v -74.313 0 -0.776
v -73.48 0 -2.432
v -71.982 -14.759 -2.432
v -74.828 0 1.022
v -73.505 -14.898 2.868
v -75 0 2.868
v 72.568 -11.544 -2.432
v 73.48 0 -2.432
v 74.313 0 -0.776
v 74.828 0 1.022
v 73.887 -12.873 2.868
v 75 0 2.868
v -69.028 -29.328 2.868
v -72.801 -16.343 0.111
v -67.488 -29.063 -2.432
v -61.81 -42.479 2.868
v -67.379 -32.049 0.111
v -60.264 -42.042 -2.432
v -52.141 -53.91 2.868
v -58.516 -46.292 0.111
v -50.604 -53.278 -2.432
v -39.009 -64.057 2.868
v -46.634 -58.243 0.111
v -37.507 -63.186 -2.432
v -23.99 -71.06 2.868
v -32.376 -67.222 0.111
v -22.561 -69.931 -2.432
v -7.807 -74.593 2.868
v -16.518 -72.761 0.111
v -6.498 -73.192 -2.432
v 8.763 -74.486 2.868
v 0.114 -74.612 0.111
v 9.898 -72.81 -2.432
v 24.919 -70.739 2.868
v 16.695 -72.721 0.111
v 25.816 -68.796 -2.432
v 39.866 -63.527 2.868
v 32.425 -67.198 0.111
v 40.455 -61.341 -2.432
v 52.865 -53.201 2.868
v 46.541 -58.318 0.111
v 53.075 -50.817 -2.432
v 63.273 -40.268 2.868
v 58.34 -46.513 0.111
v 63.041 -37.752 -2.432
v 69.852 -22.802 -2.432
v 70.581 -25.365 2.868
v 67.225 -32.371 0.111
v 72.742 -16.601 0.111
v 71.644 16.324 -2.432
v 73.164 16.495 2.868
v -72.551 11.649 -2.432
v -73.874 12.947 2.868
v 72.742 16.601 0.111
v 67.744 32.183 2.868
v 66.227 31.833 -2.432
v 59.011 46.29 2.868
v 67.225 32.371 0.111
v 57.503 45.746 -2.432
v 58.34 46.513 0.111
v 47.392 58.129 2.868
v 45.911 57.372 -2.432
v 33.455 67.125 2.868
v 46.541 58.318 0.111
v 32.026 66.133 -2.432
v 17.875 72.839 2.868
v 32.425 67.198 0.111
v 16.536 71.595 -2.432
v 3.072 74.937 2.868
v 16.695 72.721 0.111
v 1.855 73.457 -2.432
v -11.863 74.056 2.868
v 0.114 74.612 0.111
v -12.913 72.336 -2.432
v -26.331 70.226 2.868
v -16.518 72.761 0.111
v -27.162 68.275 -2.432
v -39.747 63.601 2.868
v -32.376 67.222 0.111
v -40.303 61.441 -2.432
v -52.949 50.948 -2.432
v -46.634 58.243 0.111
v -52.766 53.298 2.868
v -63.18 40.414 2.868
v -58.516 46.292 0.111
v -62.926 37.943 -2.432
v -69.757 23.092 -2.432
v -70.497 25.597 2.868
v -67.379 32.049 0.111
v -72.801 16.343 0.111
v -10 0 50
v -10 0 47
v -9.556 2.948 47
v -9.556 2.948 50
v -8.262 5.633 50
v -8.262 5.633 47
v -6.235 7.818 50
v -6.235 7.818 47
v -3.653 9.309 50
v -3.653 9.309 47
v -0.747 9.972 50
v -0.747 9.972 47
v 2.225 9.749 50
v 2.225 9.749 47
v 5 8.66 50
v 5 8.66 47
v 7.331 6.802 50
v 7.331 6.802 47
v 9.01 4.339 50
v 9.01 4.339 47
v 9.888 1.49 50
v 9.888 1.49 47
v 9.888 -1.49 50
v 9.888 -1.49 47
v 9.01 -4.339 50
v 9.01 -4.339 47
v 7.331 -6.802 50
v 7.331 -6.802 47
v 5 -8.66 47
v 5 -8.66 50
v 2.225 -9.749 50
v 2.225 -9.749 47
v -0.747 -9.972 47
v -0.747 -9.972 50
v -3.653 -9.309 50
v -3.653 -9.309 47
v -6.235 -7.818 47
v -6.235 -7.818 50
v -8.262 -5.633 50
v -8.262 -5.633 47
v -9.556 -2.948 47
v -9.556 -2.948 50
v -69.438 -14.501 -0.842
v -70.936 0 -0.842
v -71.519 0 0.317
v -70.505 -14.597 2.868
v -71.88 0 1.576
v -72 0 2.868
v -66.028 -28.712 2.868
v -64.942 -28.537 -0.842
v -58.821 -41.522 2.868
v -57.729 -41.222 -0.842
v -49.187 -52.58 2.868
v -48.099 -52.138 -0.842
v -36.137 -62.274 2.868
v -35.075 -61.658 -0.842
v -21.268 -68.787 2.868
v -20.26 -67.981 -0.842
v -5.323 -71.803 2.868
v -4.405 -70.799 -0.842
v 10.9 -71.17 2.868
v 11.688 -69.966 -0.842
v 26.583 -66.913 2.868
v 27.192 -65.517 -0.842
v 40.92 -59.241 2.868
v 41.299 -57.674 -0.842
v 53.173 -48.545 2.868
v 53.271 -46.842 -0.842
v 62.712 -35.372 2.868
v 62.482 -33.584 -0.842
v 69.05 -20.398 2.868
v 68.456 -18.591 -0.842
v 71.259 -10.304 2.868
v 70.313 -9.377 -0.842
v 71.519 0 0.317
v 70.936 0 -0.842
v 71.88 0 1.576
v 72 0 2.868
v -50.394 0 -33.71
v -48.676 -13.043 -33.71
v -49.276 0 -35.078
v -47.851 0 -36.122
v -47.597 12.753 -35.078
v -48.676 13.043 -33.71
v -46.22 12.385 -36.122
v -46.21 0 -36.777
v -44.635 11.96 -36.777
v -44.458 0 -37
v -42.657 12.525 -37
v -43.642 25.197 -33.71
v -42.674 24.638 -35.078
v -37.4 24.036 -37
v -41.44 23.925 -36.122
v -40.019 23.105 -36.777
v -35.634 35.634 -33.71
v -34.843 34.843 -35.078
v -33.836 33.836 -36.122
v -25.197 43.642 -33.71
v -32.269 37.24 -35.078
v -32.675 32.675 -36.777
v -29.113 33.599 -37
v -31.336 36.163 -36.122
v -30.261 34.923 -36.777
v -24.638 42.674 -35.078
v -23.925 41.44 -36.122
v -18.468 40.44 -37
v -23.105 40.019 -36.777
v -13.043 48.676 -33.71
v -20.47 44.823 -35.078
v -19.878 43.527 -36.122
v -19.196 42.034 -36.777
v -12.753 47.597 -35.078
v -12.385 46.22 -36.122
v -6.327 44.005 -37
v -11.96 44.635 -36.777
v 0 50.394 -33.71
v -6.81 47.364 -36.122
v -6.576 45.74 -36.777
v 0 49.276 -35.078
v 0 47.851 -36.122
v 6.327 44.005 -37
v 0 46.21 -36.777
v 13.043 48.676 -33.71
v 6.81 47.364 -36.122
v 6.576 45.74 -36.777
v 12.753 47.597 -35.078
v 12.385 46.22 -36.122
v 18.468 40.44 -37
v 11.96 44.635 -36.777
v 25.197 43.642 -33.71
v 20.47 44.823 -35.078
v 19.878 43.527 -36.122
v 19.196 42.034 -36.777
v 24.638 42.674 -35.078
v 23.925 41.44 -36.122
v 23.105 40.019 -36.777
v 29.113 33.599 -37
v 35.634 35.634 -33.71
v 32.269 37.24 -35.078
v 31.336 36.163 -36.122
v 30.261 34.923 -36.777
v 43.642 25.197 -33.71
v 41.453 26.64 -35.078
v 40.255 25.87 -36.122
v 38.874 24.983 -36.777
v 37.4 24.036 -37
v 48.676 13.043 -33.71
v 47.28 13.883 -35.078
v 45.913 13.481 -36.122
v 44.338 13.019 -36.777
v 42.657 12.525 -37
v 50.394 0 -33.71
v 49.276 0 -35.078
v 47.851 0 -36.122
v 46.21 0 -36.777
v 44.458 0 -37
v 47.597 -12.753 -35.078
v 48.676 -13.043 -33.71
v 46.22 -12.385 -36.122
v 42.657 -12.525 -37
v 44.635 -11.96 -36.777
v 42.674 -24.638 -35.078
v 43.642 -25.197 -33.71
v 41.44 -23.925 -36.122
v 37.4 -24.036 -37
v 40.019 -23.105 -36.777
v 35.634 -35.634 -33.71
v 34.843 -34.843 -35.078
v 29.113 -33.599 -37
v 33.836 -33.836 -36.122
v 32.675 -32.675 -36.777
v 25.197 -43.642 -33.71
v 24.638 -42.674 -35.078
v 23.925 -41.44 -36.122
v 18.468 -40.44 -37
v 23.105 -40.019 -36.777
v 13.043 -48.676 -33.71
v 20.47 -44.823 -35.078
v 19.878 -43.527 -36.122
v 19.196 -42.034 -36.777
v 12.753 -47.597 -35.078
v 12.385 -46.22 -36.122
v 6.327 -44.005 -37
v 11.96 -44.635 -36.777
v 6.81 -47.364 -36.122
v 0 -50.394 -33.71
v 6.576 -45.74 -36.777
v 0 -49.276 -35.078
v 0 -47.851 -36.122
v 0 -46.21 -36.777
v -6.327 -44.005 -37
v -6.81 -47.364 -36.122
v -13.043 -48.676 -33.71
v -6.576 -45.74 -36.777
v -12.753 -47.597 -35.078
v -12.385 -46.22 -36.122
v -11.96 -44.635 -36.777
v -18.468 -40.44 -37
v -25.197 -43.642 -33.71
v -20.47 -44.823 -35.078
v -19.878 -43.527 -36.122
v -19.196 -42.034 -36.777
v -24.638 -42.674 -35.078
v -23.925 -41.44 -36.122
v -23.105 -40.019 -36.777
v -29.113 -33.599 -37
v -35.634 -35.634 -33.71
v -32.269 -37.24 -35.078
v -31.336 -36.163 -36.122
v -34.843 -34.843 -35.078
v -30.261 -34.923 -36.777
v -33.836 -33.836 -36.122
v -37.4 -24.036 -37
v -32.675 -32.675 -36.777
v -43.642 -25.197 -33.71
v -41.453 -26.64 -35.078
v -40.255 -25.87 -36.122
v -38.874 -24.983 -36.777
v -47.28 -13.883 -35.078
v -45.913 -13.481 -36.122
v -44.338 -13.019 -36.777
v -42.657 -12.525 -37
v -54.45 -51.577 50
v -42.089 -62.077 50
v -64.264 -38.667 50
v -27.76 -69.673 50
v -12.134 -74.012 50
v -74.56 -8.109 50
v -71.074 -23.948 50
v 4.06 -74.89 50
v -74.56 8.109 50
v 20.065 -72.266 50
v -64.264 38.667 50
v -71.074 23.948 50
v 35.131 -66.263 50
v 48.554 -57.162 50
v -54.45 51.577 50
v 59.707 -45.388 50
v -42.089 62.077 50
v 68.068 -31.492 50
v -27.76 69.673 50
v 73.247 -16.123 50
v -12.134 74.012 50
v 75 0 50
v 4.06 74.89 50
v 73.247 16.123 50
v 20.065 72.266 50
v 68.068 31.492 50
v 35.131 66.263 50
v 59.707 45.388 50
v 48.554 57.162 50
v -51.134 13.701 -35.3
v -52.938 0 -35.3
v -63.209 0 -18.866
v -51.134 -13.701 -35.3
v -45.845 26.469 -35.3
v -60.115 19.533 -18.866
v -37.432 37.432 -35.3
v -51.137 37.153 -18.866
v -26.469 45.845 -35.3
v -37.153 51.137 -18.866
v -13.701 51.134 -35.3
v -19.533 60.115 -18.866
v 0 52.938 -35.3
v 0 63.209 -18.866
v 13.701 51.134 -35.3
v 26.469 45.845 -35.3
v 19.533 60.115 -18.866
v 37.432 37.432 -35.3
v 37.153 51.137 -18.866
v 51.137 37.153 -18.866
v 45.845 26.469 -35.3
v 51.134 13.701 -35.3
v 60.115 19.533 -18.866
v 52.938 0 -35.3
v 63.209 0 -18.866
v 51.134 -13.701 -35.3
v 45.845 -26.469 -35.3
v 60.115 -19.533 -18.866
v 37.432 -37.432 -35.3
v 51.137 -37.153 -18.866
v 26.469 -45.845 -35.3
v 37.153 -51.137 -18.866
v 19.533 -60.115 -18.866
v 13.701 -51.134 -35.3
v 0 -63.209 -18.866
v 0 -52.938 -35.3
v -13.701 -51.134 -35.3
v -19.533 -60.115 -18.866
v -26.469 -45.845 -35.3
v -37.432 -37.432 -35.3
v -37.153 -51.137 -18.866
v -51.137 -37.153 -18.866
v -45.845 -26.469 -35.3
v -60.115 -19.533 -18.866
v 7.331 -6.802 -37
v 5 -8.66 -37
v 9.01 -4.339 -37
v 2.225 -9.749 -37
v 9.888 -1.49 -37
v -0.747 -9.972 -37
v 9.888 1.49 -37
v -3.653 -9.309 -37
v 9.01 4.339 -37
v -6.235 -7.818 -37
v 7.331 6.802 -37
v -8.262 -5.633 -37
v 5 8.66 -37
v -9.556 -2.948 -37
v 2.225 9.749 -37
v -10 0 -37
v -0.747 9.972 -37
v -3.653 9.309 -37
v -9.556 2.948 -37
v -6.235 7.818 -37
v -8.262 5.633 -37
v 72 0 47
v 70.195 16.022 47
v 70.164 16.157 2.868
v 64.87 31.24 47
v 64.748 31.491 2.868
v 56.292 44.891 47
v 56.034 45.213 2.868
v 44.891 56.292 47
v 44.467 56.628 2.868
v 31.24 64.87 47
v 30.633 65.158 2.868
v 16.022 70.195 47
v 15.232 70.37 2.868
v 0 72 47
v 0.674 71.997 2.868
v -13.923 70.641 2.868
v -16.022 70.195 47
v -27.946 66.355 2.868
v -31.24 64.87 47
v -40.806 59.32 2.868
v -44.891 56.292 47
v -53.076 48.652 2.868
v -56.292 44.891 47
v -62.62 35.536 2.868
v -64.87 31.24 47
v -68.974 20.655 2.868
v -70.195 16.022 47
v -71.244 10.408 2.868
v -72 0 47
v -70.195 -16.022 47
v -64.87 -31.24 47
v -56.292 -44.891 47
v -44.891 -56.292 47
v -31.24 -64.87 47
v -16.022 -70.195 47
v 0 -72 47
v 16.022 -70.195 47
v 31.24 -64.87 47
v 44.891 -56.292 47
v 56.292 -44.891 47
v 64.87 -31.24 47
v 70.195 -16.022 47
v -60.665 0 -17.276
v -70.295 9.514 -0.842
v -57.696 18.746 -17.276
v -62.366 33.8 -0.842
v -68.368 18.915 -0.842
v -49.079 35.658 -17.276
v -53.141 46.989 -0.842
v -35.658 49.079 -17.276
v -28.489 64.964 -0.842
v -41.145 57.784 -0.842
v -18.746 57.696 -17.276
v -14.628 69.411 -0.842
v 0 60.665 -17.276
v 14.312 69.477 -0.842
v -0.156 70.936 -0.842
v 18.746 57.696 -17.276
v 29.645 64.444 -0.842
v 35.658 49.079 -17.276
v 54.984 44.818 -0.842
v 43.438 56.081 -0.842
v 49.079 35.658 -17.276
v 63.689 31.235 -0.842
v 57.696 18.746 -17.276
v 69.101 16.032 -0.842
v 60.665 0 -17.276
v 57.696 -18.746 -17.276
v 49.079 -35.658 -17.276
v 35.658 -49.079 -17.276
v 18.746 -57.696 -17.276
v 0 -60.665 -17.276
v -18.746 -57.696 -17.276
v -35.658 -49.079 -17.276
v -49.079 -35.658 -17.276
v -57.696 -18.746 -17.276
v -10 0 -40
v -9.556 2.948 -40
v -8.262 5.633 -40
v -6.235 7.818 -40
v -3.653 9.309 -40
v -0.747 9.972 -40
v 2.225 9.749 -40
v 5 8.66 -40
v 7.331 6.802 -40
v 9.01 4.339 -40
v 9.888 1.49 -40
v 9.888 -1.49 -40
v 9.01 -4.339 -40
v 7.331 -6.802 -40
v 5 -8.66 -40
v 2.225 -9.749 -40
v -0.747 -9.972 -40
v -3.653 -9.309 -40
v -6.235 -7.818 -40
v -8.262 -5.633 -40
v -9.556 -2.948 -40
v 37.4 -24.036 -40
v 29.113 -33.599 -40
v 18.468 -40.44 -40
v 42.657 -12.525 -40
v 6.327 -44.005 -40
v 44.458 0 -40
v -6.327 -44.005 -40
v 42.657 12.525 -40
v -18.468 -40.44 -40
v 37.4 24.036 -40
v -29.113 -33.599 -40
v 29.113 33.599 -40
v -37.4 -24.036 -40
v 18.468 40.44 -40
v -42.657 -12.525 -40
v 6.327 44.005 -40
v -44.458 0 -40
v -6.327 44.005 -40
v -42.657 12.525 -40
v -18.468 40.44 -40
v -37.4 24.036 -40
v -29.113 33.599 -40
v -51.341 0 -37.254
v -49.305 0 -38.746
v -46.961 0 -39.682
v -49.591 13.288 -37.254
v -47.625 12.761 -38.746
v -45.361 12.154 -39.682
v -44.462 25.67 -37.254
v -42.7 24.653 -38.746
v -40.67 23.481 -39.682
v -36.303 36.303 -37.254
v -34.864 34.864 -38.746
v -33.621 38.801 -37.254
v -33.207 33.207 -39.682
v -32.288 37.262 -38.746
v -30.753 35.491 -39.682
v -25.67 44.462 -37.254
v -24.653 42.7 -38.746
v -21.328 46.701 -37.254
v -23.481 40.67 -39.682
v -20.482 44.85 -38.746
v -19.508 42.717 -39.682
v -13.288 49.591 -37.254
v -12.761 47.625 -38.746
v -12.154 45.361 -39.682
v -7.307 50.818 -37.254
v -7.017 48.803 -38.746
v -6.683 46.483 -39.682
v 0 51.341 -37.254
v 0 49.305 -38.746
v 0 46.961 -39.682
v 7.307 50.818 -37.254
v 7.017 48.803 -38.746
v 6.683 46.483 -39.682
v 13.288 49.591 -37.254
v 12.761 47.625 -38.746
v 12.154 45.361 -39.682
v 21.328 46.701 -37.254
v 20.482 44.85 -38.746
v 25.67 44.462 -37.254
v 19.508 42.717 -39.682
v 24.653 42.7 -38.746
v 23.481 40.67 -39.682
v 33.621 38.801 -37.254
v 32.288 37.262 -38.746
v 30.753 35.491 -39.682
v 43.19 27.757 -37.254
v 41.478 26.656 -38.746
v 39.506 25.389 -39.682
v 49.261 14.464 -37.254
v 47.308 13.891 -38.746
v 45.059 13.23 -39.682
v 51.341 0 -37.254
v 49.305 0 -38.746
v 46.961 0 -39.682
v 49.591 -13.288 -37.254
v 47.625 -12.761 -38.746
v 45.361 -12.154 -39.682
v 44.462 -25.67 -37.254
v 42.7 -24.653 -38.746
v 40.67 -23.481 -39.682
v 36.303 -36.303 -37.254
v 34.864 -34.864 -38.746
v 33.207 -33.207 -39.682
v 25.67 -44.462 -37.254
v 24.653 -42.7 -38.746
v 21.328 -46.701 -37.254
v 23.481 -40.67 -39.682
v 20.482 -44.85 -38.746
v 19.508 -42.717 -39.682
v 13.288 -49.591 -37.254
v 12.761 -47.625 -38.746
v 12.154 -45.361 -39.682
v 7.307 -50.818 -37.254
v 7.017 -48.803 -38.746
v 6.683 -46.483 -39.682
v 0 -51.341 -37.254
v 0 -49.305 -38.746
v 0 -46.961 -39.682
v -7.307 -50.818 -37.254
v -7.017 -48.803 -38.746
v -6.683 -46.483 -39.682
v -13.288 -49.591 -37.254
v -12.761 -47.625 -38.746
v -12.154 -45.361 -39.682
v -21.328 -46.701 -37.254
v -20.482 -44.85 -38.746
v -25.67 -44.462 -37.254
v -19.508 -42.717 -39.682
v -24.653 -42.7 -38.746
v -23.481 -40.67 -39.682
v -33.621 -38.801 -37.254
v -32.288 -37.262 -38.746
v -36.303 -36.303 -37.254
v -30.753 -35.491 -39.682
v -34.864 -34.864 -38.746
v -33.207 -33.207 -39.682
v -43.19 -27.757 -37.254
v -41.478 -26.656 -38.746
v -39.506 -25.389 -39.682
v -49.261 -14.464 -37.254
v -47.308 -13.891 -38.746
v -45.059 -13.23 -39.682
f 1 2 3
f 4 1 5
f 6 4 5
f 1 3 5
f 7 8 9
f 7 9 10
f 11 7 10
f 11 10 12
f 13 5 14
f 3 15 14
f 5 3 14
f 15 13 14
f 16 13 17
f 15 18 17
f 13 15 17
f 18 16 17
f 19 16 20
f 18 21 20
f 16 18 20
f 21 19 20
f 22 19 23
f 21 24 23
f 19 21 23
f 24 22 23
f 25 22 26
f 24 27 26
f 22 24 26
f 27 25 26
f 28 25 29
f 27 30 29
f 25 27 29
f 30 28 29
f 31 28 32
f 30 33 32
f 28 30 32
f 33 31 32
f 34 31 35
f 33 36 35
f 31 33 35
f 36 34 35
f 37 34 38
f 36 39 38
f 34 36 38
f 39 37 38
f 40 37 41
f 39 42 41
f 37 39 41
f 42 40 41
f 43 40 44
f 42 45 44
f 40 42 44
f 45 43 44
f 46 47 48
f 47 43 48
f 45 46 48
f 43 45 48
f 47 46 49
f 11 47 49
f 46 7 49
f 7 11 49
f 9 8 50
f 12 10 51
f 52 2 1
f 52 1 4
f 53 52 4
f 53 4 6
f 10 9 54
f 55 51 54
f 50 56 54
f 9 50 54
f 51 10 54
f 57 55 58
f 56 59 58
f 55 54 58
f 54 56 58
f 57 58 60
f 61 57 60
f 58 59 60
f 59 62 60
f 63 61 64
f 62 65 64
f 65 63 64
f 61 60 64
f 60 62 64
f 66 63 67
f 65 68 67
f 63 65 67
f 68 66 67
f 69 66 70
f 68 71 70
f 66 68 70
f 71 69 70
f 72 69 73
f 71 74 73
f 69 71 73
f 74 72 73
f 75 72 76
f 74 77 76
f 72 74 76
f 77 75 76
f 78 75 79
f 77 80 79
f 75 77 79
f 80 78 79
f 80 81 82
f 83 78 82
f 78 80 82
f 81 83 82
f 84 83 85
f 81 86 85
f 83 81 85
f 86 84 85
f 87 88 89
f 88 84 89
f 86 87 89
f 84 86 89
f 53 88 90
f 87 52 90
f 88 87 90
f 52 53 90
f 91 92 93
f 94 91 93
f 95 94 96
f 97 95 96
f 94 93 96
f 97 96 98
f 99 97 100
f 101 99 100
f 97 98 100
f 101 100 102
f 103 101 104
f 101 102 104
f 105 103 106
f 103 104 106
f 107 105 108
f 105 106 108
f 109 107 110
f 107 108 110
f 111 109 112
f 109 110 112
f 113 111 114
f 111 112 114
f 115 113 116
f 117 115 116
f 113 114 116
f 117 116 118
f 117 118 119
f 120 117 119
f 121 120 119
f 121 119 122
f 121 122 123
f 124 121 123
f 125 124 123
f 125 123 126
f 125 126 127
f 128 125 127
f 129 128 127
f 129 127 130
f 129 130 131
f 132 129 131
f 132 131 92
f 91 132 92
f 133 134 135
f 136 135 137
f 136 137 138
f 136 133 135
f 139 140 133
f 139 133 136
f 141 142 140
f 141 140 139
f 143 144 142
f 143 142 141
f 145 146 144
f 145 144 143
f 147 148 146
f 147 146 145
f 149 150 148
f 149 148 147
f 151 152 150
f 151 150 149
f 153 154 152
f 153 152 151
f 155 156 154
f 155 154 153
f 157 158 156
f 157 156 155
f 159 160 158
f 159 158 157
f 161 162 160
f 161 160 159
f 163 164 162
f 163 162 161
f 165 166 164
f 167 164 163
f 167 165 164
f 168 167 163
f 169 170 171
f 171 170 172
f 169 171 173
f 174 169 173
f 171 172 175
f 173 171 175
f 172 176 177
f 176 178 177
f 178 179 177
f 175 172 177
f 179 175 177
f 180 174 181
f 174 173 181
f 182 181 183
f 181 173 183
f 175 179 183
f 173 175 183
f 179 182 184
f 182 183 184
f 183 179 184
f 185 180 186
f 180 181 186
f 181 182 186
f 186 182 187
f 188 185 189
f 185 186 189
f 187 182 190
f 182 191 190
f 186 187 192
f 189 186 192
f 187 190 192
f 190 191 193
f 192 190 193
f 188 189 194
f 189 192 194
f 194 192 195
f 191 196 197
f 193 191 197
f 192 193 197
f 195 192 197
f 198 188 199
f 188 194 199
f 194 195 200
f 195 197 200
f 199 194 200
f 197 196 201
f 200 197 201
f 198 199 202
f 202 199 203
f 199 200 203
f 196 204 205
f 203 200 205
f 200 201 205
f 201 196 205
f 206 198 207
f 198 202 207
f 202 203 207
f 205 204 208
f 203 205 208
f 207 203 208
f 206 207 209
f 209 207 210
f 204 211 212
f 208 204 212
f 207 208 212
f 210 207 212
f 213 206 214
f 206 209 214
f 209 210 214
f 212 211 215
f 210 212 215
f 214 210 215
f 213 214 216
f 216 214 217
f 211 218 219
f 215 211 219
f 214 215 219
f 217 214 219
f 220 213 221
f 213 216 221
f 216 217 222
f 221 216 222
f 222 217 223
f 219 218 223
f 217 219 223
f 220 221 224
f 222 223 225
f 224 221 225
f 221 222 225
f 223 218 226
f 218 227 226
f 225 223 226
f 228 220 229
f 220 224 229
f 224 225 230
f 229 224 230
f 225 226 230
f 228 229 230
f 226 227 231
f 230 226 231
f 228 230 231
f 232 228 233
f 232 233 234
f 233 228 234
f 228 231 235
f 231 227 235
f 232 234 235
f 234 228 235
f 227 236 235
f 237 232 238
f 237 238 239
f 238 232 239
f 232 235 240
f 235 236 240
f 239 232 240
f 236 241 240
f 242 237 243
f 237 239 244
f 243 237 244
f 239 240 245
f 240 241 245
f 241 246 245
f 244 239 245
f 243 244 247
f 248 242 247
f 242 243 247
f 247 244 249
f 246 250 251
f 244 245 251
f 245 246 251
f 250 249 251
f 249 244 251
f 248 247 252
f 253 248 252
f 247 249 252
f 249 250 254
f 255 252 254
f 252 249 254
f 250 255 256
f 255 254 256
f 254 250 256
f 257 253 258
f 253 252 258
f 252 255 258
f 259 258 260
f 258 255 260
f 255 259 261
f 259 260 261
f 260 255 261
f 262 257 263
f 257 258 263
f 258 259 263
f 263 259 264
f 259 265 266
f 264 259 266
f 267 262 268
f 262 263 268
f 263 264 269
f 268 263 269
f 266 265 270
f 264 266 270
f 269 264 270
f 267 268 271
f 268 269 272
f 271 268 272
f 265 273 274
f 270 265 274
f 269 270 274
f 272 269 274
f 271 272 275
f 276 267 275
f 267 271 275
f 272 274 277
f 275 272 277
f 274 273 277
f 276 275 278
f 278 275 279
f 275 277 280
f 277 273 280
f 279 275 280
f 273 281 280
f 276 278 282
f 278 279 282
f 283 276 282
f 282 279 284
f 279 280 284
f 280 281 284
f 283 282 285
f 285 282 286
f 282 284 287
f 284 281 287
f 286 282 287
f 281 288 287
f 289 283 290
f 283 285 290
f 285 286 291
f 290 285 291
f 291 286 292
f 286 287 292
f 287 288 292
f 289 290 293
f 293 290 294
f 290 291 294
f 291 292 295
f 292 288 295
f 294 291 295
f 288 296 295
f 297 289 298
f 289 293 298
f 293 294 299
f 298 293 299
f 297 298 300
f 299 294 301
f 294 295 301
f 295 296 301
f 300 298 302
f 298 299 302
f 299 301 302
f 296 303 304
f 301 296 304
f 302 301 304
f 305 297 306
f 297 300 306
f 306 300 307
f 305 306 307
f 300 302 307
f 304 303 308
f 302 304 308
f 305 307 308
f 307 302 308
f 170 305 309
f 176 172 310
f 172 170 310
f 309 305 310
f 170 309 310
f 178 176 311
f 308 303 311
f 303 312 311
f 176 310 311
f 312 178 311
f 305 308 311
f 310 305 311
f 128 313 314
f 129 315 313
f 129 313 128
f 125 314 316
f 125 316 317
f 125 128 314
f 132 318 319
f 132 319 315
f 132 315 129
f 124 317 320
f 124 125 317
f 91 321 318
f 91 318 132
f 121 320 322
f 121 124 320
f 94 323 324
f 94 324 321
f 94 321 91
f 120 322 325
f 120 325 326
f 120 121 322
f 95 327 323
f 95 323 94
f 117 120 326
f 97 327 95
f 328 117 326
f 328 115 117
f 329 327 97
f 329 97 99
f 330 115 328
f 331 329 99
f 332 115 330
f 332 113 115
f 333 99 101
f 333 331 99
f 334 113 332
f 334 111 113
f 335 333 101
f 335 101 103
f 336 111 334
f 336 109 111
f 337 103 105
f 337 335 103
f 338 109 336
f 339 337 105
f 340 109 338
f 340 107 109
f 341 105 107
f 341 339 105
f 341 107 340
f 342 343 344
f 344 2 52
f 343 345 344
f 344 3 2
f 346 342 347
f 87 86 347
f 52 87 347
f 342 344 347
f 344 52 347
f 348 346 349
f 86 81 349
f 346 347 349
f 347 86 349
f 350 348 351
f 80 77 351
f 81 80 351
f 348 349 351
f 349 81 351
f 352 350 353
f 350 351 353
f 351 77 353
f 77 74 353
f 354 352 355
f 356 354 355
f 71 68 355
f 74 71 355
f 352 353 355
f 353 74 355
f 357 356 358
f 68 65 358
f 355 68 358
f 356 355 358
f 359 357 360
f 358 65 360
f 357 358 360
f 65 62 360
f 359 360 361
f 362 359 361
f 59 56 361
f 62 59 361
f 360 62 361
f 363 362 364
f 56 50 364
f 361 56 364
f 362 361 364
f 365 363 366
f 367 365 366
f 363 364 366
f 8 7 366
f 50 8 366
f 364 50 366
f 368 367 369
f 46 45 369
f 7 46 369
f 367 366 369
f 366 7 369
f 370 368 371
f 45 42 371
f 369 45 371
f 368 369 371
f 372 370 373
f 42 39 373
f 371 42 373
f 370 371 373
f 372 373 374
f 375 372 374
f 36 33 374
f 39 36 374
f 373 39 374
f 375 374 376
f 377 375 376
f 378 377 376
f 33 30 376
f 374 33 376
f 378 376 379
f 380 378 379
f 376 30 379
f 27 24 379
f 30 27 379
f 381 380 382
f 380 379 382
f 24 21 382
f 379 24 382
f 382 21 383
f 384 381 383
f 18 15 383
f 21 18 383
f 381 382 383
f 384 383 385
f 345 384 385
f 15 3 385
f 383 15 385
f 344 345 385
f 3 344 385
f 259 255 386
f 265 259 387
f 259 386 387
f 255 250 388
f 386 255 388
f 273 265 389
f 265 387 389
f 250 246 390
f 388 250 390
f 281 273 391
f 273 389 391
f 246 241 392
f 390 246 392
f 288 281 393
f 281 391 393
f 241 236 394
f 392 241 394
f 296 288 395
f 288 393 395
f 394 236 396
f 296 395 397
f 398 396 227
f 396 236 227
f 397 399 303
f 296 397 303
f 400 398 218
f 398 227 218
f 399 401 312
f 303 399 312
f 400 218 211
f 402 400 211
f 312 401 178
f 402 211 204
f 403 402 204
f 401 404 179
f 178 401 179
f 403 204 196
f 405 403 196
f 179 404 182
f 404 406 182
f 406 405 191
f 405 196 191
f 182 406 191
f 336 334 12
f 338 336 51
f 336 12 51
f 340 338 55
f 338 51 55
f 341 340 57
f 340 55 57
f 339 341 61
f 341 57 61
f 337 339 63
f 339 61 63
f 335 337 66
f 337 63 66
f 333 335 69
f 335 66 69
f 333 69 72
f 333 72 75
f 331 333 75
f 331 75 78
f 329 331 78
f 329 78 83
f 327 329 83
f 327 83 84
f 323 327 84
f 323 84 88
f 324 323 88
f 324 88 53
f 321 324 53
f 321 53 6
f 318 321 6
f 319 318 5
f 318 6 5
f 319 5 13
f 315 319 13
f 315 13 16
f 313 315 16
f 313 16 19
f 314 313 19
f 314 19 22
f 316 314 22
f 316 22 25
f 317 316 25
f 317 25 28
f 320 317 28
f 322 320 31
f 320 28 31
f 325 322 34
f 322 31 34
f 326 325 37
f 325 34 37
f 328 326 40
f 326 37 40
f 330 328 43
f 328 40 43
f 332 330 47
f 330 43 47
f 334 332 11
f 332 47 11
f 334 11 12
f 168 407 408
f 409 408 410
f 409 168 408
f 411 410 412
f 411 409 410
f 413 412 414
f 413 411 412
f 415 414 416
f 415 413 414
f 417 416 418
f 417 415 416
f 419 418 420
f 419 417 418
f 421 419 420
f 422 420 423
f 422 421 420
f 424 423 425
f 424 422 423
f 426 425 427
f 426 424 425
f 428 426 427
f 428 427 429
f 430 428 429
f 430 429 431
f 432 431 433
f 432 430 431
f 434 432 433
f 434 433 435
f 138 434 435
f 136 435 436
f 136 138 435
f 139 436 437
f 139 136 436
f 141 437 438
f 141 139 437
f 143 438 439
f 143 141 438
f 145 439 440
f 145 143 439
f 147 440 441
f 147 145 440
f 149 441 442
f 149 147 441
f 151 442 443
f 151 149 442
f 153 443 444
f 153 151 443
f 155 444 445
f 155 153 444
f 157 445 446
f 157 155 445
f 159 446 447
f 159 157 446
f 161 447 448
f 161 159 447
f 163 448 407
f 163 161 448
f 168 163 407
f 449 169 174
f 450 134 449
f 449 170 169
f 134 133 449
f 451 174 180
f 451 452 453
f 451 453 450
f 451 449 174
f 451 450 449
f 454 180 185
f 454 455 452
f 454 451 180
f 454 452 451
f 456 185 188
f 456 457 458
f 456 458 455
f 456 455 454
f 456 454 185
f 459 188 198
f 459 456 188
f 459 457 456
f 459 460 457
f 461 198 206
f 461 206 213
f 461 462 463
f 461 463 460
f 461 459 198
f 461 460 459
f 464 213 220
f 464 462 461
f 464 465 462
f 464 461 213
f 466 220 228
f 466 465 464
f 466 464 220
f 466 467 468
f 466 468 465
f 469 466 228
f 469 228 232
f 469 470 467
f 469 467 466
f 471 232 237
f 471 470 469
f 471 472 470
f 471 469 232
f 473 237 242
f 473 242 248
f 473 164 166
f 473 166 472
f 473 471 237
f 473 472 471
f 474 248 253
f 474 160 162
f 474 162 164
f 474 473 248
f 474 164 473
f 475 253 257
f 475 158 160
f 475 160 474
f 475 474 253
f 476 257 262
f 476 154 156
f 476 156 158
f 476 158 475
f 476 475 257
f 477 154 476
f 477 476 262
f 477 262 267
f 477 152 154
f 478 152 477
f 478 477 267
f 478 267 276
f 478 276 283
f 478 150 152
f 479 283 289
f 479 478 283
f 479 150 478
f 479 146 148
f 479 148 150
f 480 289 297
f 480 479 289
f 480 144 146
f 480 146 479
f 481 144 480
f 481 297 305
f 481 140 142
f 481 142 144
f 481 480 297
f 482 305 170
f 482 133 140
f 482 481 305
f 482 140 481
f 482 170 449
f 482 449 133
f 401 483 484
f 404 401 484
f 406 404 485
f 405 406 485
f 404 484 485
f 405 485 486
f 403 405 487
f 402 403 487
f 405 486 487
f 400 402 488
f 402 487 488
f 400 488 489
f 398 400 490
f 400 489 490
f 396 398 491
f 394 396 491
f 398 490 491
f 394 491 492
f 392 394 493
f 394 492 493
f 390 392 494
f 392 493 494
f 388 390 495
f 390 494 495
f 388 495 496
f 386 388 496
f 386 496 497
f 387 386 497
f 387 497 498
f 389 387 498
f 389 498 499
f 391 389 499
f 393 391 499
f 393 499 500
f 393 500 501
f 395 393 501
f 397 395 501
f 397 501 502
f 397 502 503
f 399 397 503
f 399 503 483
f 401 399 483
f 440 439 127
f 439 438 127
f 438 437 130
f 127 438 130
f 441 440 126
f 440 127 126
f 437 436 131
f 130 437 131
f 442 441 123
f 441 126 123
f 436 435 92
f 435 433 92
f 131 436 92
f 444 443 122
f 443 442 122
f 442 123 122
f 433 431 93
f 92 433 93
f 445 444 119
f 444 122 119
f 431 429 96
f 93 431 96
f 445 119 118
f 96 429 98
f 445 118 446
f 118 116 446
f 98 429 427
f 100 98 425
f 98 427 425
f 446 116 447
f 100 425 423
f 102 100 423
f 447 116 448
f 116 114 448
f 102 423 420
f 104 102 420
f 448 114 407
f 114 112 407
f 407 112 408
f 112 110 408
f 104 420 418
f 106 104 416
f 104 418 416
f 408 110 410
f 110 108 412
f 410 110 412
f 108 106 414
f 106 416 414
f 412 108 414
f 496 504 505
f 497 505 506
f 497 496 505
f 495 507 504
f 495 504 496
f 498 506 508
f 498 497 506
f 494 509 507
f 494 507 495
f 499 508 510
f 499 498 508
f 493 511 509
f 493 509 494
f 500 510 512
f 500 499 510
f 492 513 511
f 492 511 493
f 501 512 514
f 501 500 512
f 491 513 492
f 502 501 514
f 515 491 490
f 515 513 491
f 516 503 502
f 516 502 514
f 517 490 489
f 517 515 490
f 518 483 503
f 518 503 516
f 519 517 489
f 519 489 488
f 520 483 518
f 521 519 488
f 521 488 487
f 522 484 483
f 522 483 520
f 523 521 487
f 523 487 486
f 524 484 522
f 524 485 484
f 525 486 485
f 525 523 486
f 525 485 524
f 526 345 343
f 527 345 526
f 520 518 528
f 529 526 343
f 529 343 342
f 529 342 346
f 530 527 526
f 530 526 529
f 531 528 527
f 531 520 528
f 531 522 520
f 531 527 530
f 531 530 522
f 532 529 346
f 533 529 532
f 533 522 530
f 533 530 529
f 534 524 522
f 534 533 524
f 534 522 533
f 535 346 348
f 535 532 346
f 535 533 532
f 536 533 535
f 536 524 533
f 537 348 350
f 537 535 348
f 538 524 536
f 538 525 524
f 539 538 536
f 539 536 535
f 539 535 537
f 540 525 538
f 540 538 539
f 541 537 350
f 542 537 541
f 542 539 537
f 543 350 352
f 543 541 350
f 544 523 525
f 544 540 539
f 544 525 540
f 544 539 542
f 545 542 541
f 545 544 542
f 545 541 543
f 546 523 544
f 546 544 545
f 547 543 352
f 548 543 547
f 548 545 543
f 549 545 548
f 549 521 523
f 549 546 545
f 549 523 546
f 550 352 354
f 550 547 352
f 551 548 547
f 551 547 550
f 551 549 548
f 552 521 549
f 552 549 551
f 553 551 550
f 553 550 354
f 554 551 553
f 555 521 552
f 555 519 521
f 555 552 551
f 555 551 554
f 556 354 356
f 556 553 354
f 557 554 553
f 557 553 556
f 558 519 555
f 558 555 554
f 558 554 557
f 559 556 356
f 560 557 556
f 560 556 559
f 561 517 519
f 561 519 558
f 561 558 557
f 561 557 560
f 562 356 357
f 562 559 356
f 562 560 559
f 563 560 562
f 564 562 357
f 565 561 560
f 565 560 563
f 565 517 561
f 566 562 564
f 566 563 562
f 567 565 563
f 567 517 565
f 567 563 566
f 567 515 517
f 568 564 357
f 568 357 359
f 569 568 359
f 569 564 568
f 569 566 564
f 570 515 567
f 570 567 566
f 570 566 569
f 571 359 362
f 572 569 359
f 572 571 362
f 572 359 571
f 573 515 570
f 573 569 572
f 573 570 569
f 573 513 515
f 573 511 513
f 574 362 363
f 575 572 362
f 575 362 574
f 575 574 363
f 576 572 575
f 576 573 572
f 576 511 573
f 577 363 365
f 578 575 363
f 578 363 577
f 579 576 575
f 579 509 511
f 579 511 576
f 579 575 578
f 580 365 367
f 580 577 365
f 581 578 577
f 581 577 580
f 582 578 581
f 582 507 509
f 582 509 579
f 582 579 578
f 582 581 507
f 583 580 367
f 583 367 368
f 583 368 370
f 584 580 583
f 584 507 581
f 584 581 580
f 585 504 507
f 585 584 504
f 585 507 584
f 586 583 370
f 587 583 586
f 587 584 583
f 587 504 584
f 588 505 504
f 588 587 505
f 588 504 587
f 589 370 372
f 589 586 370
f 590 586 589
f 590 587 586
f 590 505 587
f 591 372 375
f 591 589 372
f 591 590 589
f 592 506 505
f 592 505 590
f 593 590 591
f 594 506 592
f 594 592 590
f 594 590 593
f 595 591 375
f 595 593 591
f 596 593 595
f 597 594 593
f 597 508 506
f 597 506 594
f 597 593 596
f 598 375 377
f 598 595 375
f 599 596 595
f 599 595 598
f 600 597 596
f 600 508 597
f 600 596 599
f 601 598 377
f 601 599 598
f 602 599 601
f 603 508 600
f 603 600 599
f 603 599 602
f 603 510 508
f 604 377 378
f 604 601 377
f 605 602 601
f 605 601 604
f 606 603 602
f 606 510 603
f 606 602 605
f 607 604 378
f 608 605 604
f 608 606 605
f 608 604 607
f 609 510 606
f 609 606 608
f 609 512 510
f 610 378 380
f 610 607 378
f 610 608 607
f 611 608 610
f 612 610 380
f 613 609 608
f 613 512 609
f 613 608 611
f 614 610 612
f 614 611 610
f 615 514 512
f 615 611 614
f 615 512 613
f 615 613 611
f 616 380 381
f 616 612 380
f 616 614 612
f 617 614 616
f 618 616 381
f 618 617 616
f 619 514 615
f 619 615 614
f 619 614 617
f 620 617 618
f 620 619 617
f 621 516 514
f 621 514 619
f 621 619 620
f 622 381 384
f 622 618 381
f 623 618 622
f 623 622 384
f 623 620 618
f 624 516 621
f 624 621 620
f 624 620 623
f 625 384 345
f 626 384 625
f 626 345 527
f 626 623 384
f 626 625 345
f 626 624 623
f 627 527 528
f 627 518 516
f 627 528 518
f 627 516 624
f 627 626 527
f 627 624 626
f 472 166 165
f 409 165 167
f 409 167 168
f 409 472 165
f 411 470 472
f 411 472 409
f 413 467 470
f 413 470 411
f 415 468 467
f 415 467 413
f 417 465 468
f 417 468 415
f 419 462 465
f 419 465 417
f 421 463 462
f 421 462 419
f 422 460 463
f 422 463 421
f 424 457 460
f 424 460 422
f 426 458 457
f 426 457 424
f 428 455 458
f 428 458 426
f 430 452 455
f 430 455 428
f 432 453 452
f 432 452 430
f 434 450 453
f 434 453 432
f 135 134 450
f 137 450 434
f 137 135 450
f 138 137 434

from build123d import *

# Parameters (mm, degrees)
SKETCH_1_R          = 75
EXTRUDE_1_DEPTH     = 50
SKETCH_3_R          = 50
SKETCH_2_R          = 75
FILLET_1_R          = 10
SKETCH_4_R          = 10
CUT_EXTRUDE_1_DEPTH = 140.104278635
SHELL_1_T           = -3


with BuildPart() as part:
    # 草图1 → 凸台-拉伸1 (new body)
    with BuildSketch(Plane.XY):
        Circle(SKETCH_1_R)
    extrude(amount=EXTRUDE_1_DEPTH)

    # 草图3 → 放样1 section 0
    with BuildSketch(Plane(origin=(0, 0, -40), x_dir=(-1, 0, 0), z_dir=(0, 0, -1))):
        Circle(SKETCH_3_R)
    # 草图2 → 放样1 section 1
    with BuildSketch(Plane(origin=(0, 0, 0), x_dir=(-1, 0, 0), z_dir=(0, 0, -1))):
        Circle(SKETCH_2_R)
    loft()

    # 圆角1
    fillet_1_edges = [part.edges().sort_by_distance(p)[0] for p in [
        (50, 0, -40),
        (0, 75, 0),
    ]]
    fillet(fillet_1_edges, radius=FILLET_1_R)

    # 草图4 → 切除-拉伸1 (cut, through all)
    with BuildSketch(Plane(origin=(0, 0, -40), x_dir=(-1, 0, 0), z_dir=(0, 0, -1))):
        Circle(SKETCH_4_R)
    extrude(amount=-CUT_EXTRUDE_1_DEPTH, mode=Mode.SUBTRACT)

    # 抽壳1
    shell_1_openings = [part.faces().sort_by_distance(p)[0] for p in [
        (10, 0, 5),
    ]]
    offset(amount=SHELL_1_T, openings=shell_1_openings, kind=Kind.INTERSECTION)


solid = part.part
